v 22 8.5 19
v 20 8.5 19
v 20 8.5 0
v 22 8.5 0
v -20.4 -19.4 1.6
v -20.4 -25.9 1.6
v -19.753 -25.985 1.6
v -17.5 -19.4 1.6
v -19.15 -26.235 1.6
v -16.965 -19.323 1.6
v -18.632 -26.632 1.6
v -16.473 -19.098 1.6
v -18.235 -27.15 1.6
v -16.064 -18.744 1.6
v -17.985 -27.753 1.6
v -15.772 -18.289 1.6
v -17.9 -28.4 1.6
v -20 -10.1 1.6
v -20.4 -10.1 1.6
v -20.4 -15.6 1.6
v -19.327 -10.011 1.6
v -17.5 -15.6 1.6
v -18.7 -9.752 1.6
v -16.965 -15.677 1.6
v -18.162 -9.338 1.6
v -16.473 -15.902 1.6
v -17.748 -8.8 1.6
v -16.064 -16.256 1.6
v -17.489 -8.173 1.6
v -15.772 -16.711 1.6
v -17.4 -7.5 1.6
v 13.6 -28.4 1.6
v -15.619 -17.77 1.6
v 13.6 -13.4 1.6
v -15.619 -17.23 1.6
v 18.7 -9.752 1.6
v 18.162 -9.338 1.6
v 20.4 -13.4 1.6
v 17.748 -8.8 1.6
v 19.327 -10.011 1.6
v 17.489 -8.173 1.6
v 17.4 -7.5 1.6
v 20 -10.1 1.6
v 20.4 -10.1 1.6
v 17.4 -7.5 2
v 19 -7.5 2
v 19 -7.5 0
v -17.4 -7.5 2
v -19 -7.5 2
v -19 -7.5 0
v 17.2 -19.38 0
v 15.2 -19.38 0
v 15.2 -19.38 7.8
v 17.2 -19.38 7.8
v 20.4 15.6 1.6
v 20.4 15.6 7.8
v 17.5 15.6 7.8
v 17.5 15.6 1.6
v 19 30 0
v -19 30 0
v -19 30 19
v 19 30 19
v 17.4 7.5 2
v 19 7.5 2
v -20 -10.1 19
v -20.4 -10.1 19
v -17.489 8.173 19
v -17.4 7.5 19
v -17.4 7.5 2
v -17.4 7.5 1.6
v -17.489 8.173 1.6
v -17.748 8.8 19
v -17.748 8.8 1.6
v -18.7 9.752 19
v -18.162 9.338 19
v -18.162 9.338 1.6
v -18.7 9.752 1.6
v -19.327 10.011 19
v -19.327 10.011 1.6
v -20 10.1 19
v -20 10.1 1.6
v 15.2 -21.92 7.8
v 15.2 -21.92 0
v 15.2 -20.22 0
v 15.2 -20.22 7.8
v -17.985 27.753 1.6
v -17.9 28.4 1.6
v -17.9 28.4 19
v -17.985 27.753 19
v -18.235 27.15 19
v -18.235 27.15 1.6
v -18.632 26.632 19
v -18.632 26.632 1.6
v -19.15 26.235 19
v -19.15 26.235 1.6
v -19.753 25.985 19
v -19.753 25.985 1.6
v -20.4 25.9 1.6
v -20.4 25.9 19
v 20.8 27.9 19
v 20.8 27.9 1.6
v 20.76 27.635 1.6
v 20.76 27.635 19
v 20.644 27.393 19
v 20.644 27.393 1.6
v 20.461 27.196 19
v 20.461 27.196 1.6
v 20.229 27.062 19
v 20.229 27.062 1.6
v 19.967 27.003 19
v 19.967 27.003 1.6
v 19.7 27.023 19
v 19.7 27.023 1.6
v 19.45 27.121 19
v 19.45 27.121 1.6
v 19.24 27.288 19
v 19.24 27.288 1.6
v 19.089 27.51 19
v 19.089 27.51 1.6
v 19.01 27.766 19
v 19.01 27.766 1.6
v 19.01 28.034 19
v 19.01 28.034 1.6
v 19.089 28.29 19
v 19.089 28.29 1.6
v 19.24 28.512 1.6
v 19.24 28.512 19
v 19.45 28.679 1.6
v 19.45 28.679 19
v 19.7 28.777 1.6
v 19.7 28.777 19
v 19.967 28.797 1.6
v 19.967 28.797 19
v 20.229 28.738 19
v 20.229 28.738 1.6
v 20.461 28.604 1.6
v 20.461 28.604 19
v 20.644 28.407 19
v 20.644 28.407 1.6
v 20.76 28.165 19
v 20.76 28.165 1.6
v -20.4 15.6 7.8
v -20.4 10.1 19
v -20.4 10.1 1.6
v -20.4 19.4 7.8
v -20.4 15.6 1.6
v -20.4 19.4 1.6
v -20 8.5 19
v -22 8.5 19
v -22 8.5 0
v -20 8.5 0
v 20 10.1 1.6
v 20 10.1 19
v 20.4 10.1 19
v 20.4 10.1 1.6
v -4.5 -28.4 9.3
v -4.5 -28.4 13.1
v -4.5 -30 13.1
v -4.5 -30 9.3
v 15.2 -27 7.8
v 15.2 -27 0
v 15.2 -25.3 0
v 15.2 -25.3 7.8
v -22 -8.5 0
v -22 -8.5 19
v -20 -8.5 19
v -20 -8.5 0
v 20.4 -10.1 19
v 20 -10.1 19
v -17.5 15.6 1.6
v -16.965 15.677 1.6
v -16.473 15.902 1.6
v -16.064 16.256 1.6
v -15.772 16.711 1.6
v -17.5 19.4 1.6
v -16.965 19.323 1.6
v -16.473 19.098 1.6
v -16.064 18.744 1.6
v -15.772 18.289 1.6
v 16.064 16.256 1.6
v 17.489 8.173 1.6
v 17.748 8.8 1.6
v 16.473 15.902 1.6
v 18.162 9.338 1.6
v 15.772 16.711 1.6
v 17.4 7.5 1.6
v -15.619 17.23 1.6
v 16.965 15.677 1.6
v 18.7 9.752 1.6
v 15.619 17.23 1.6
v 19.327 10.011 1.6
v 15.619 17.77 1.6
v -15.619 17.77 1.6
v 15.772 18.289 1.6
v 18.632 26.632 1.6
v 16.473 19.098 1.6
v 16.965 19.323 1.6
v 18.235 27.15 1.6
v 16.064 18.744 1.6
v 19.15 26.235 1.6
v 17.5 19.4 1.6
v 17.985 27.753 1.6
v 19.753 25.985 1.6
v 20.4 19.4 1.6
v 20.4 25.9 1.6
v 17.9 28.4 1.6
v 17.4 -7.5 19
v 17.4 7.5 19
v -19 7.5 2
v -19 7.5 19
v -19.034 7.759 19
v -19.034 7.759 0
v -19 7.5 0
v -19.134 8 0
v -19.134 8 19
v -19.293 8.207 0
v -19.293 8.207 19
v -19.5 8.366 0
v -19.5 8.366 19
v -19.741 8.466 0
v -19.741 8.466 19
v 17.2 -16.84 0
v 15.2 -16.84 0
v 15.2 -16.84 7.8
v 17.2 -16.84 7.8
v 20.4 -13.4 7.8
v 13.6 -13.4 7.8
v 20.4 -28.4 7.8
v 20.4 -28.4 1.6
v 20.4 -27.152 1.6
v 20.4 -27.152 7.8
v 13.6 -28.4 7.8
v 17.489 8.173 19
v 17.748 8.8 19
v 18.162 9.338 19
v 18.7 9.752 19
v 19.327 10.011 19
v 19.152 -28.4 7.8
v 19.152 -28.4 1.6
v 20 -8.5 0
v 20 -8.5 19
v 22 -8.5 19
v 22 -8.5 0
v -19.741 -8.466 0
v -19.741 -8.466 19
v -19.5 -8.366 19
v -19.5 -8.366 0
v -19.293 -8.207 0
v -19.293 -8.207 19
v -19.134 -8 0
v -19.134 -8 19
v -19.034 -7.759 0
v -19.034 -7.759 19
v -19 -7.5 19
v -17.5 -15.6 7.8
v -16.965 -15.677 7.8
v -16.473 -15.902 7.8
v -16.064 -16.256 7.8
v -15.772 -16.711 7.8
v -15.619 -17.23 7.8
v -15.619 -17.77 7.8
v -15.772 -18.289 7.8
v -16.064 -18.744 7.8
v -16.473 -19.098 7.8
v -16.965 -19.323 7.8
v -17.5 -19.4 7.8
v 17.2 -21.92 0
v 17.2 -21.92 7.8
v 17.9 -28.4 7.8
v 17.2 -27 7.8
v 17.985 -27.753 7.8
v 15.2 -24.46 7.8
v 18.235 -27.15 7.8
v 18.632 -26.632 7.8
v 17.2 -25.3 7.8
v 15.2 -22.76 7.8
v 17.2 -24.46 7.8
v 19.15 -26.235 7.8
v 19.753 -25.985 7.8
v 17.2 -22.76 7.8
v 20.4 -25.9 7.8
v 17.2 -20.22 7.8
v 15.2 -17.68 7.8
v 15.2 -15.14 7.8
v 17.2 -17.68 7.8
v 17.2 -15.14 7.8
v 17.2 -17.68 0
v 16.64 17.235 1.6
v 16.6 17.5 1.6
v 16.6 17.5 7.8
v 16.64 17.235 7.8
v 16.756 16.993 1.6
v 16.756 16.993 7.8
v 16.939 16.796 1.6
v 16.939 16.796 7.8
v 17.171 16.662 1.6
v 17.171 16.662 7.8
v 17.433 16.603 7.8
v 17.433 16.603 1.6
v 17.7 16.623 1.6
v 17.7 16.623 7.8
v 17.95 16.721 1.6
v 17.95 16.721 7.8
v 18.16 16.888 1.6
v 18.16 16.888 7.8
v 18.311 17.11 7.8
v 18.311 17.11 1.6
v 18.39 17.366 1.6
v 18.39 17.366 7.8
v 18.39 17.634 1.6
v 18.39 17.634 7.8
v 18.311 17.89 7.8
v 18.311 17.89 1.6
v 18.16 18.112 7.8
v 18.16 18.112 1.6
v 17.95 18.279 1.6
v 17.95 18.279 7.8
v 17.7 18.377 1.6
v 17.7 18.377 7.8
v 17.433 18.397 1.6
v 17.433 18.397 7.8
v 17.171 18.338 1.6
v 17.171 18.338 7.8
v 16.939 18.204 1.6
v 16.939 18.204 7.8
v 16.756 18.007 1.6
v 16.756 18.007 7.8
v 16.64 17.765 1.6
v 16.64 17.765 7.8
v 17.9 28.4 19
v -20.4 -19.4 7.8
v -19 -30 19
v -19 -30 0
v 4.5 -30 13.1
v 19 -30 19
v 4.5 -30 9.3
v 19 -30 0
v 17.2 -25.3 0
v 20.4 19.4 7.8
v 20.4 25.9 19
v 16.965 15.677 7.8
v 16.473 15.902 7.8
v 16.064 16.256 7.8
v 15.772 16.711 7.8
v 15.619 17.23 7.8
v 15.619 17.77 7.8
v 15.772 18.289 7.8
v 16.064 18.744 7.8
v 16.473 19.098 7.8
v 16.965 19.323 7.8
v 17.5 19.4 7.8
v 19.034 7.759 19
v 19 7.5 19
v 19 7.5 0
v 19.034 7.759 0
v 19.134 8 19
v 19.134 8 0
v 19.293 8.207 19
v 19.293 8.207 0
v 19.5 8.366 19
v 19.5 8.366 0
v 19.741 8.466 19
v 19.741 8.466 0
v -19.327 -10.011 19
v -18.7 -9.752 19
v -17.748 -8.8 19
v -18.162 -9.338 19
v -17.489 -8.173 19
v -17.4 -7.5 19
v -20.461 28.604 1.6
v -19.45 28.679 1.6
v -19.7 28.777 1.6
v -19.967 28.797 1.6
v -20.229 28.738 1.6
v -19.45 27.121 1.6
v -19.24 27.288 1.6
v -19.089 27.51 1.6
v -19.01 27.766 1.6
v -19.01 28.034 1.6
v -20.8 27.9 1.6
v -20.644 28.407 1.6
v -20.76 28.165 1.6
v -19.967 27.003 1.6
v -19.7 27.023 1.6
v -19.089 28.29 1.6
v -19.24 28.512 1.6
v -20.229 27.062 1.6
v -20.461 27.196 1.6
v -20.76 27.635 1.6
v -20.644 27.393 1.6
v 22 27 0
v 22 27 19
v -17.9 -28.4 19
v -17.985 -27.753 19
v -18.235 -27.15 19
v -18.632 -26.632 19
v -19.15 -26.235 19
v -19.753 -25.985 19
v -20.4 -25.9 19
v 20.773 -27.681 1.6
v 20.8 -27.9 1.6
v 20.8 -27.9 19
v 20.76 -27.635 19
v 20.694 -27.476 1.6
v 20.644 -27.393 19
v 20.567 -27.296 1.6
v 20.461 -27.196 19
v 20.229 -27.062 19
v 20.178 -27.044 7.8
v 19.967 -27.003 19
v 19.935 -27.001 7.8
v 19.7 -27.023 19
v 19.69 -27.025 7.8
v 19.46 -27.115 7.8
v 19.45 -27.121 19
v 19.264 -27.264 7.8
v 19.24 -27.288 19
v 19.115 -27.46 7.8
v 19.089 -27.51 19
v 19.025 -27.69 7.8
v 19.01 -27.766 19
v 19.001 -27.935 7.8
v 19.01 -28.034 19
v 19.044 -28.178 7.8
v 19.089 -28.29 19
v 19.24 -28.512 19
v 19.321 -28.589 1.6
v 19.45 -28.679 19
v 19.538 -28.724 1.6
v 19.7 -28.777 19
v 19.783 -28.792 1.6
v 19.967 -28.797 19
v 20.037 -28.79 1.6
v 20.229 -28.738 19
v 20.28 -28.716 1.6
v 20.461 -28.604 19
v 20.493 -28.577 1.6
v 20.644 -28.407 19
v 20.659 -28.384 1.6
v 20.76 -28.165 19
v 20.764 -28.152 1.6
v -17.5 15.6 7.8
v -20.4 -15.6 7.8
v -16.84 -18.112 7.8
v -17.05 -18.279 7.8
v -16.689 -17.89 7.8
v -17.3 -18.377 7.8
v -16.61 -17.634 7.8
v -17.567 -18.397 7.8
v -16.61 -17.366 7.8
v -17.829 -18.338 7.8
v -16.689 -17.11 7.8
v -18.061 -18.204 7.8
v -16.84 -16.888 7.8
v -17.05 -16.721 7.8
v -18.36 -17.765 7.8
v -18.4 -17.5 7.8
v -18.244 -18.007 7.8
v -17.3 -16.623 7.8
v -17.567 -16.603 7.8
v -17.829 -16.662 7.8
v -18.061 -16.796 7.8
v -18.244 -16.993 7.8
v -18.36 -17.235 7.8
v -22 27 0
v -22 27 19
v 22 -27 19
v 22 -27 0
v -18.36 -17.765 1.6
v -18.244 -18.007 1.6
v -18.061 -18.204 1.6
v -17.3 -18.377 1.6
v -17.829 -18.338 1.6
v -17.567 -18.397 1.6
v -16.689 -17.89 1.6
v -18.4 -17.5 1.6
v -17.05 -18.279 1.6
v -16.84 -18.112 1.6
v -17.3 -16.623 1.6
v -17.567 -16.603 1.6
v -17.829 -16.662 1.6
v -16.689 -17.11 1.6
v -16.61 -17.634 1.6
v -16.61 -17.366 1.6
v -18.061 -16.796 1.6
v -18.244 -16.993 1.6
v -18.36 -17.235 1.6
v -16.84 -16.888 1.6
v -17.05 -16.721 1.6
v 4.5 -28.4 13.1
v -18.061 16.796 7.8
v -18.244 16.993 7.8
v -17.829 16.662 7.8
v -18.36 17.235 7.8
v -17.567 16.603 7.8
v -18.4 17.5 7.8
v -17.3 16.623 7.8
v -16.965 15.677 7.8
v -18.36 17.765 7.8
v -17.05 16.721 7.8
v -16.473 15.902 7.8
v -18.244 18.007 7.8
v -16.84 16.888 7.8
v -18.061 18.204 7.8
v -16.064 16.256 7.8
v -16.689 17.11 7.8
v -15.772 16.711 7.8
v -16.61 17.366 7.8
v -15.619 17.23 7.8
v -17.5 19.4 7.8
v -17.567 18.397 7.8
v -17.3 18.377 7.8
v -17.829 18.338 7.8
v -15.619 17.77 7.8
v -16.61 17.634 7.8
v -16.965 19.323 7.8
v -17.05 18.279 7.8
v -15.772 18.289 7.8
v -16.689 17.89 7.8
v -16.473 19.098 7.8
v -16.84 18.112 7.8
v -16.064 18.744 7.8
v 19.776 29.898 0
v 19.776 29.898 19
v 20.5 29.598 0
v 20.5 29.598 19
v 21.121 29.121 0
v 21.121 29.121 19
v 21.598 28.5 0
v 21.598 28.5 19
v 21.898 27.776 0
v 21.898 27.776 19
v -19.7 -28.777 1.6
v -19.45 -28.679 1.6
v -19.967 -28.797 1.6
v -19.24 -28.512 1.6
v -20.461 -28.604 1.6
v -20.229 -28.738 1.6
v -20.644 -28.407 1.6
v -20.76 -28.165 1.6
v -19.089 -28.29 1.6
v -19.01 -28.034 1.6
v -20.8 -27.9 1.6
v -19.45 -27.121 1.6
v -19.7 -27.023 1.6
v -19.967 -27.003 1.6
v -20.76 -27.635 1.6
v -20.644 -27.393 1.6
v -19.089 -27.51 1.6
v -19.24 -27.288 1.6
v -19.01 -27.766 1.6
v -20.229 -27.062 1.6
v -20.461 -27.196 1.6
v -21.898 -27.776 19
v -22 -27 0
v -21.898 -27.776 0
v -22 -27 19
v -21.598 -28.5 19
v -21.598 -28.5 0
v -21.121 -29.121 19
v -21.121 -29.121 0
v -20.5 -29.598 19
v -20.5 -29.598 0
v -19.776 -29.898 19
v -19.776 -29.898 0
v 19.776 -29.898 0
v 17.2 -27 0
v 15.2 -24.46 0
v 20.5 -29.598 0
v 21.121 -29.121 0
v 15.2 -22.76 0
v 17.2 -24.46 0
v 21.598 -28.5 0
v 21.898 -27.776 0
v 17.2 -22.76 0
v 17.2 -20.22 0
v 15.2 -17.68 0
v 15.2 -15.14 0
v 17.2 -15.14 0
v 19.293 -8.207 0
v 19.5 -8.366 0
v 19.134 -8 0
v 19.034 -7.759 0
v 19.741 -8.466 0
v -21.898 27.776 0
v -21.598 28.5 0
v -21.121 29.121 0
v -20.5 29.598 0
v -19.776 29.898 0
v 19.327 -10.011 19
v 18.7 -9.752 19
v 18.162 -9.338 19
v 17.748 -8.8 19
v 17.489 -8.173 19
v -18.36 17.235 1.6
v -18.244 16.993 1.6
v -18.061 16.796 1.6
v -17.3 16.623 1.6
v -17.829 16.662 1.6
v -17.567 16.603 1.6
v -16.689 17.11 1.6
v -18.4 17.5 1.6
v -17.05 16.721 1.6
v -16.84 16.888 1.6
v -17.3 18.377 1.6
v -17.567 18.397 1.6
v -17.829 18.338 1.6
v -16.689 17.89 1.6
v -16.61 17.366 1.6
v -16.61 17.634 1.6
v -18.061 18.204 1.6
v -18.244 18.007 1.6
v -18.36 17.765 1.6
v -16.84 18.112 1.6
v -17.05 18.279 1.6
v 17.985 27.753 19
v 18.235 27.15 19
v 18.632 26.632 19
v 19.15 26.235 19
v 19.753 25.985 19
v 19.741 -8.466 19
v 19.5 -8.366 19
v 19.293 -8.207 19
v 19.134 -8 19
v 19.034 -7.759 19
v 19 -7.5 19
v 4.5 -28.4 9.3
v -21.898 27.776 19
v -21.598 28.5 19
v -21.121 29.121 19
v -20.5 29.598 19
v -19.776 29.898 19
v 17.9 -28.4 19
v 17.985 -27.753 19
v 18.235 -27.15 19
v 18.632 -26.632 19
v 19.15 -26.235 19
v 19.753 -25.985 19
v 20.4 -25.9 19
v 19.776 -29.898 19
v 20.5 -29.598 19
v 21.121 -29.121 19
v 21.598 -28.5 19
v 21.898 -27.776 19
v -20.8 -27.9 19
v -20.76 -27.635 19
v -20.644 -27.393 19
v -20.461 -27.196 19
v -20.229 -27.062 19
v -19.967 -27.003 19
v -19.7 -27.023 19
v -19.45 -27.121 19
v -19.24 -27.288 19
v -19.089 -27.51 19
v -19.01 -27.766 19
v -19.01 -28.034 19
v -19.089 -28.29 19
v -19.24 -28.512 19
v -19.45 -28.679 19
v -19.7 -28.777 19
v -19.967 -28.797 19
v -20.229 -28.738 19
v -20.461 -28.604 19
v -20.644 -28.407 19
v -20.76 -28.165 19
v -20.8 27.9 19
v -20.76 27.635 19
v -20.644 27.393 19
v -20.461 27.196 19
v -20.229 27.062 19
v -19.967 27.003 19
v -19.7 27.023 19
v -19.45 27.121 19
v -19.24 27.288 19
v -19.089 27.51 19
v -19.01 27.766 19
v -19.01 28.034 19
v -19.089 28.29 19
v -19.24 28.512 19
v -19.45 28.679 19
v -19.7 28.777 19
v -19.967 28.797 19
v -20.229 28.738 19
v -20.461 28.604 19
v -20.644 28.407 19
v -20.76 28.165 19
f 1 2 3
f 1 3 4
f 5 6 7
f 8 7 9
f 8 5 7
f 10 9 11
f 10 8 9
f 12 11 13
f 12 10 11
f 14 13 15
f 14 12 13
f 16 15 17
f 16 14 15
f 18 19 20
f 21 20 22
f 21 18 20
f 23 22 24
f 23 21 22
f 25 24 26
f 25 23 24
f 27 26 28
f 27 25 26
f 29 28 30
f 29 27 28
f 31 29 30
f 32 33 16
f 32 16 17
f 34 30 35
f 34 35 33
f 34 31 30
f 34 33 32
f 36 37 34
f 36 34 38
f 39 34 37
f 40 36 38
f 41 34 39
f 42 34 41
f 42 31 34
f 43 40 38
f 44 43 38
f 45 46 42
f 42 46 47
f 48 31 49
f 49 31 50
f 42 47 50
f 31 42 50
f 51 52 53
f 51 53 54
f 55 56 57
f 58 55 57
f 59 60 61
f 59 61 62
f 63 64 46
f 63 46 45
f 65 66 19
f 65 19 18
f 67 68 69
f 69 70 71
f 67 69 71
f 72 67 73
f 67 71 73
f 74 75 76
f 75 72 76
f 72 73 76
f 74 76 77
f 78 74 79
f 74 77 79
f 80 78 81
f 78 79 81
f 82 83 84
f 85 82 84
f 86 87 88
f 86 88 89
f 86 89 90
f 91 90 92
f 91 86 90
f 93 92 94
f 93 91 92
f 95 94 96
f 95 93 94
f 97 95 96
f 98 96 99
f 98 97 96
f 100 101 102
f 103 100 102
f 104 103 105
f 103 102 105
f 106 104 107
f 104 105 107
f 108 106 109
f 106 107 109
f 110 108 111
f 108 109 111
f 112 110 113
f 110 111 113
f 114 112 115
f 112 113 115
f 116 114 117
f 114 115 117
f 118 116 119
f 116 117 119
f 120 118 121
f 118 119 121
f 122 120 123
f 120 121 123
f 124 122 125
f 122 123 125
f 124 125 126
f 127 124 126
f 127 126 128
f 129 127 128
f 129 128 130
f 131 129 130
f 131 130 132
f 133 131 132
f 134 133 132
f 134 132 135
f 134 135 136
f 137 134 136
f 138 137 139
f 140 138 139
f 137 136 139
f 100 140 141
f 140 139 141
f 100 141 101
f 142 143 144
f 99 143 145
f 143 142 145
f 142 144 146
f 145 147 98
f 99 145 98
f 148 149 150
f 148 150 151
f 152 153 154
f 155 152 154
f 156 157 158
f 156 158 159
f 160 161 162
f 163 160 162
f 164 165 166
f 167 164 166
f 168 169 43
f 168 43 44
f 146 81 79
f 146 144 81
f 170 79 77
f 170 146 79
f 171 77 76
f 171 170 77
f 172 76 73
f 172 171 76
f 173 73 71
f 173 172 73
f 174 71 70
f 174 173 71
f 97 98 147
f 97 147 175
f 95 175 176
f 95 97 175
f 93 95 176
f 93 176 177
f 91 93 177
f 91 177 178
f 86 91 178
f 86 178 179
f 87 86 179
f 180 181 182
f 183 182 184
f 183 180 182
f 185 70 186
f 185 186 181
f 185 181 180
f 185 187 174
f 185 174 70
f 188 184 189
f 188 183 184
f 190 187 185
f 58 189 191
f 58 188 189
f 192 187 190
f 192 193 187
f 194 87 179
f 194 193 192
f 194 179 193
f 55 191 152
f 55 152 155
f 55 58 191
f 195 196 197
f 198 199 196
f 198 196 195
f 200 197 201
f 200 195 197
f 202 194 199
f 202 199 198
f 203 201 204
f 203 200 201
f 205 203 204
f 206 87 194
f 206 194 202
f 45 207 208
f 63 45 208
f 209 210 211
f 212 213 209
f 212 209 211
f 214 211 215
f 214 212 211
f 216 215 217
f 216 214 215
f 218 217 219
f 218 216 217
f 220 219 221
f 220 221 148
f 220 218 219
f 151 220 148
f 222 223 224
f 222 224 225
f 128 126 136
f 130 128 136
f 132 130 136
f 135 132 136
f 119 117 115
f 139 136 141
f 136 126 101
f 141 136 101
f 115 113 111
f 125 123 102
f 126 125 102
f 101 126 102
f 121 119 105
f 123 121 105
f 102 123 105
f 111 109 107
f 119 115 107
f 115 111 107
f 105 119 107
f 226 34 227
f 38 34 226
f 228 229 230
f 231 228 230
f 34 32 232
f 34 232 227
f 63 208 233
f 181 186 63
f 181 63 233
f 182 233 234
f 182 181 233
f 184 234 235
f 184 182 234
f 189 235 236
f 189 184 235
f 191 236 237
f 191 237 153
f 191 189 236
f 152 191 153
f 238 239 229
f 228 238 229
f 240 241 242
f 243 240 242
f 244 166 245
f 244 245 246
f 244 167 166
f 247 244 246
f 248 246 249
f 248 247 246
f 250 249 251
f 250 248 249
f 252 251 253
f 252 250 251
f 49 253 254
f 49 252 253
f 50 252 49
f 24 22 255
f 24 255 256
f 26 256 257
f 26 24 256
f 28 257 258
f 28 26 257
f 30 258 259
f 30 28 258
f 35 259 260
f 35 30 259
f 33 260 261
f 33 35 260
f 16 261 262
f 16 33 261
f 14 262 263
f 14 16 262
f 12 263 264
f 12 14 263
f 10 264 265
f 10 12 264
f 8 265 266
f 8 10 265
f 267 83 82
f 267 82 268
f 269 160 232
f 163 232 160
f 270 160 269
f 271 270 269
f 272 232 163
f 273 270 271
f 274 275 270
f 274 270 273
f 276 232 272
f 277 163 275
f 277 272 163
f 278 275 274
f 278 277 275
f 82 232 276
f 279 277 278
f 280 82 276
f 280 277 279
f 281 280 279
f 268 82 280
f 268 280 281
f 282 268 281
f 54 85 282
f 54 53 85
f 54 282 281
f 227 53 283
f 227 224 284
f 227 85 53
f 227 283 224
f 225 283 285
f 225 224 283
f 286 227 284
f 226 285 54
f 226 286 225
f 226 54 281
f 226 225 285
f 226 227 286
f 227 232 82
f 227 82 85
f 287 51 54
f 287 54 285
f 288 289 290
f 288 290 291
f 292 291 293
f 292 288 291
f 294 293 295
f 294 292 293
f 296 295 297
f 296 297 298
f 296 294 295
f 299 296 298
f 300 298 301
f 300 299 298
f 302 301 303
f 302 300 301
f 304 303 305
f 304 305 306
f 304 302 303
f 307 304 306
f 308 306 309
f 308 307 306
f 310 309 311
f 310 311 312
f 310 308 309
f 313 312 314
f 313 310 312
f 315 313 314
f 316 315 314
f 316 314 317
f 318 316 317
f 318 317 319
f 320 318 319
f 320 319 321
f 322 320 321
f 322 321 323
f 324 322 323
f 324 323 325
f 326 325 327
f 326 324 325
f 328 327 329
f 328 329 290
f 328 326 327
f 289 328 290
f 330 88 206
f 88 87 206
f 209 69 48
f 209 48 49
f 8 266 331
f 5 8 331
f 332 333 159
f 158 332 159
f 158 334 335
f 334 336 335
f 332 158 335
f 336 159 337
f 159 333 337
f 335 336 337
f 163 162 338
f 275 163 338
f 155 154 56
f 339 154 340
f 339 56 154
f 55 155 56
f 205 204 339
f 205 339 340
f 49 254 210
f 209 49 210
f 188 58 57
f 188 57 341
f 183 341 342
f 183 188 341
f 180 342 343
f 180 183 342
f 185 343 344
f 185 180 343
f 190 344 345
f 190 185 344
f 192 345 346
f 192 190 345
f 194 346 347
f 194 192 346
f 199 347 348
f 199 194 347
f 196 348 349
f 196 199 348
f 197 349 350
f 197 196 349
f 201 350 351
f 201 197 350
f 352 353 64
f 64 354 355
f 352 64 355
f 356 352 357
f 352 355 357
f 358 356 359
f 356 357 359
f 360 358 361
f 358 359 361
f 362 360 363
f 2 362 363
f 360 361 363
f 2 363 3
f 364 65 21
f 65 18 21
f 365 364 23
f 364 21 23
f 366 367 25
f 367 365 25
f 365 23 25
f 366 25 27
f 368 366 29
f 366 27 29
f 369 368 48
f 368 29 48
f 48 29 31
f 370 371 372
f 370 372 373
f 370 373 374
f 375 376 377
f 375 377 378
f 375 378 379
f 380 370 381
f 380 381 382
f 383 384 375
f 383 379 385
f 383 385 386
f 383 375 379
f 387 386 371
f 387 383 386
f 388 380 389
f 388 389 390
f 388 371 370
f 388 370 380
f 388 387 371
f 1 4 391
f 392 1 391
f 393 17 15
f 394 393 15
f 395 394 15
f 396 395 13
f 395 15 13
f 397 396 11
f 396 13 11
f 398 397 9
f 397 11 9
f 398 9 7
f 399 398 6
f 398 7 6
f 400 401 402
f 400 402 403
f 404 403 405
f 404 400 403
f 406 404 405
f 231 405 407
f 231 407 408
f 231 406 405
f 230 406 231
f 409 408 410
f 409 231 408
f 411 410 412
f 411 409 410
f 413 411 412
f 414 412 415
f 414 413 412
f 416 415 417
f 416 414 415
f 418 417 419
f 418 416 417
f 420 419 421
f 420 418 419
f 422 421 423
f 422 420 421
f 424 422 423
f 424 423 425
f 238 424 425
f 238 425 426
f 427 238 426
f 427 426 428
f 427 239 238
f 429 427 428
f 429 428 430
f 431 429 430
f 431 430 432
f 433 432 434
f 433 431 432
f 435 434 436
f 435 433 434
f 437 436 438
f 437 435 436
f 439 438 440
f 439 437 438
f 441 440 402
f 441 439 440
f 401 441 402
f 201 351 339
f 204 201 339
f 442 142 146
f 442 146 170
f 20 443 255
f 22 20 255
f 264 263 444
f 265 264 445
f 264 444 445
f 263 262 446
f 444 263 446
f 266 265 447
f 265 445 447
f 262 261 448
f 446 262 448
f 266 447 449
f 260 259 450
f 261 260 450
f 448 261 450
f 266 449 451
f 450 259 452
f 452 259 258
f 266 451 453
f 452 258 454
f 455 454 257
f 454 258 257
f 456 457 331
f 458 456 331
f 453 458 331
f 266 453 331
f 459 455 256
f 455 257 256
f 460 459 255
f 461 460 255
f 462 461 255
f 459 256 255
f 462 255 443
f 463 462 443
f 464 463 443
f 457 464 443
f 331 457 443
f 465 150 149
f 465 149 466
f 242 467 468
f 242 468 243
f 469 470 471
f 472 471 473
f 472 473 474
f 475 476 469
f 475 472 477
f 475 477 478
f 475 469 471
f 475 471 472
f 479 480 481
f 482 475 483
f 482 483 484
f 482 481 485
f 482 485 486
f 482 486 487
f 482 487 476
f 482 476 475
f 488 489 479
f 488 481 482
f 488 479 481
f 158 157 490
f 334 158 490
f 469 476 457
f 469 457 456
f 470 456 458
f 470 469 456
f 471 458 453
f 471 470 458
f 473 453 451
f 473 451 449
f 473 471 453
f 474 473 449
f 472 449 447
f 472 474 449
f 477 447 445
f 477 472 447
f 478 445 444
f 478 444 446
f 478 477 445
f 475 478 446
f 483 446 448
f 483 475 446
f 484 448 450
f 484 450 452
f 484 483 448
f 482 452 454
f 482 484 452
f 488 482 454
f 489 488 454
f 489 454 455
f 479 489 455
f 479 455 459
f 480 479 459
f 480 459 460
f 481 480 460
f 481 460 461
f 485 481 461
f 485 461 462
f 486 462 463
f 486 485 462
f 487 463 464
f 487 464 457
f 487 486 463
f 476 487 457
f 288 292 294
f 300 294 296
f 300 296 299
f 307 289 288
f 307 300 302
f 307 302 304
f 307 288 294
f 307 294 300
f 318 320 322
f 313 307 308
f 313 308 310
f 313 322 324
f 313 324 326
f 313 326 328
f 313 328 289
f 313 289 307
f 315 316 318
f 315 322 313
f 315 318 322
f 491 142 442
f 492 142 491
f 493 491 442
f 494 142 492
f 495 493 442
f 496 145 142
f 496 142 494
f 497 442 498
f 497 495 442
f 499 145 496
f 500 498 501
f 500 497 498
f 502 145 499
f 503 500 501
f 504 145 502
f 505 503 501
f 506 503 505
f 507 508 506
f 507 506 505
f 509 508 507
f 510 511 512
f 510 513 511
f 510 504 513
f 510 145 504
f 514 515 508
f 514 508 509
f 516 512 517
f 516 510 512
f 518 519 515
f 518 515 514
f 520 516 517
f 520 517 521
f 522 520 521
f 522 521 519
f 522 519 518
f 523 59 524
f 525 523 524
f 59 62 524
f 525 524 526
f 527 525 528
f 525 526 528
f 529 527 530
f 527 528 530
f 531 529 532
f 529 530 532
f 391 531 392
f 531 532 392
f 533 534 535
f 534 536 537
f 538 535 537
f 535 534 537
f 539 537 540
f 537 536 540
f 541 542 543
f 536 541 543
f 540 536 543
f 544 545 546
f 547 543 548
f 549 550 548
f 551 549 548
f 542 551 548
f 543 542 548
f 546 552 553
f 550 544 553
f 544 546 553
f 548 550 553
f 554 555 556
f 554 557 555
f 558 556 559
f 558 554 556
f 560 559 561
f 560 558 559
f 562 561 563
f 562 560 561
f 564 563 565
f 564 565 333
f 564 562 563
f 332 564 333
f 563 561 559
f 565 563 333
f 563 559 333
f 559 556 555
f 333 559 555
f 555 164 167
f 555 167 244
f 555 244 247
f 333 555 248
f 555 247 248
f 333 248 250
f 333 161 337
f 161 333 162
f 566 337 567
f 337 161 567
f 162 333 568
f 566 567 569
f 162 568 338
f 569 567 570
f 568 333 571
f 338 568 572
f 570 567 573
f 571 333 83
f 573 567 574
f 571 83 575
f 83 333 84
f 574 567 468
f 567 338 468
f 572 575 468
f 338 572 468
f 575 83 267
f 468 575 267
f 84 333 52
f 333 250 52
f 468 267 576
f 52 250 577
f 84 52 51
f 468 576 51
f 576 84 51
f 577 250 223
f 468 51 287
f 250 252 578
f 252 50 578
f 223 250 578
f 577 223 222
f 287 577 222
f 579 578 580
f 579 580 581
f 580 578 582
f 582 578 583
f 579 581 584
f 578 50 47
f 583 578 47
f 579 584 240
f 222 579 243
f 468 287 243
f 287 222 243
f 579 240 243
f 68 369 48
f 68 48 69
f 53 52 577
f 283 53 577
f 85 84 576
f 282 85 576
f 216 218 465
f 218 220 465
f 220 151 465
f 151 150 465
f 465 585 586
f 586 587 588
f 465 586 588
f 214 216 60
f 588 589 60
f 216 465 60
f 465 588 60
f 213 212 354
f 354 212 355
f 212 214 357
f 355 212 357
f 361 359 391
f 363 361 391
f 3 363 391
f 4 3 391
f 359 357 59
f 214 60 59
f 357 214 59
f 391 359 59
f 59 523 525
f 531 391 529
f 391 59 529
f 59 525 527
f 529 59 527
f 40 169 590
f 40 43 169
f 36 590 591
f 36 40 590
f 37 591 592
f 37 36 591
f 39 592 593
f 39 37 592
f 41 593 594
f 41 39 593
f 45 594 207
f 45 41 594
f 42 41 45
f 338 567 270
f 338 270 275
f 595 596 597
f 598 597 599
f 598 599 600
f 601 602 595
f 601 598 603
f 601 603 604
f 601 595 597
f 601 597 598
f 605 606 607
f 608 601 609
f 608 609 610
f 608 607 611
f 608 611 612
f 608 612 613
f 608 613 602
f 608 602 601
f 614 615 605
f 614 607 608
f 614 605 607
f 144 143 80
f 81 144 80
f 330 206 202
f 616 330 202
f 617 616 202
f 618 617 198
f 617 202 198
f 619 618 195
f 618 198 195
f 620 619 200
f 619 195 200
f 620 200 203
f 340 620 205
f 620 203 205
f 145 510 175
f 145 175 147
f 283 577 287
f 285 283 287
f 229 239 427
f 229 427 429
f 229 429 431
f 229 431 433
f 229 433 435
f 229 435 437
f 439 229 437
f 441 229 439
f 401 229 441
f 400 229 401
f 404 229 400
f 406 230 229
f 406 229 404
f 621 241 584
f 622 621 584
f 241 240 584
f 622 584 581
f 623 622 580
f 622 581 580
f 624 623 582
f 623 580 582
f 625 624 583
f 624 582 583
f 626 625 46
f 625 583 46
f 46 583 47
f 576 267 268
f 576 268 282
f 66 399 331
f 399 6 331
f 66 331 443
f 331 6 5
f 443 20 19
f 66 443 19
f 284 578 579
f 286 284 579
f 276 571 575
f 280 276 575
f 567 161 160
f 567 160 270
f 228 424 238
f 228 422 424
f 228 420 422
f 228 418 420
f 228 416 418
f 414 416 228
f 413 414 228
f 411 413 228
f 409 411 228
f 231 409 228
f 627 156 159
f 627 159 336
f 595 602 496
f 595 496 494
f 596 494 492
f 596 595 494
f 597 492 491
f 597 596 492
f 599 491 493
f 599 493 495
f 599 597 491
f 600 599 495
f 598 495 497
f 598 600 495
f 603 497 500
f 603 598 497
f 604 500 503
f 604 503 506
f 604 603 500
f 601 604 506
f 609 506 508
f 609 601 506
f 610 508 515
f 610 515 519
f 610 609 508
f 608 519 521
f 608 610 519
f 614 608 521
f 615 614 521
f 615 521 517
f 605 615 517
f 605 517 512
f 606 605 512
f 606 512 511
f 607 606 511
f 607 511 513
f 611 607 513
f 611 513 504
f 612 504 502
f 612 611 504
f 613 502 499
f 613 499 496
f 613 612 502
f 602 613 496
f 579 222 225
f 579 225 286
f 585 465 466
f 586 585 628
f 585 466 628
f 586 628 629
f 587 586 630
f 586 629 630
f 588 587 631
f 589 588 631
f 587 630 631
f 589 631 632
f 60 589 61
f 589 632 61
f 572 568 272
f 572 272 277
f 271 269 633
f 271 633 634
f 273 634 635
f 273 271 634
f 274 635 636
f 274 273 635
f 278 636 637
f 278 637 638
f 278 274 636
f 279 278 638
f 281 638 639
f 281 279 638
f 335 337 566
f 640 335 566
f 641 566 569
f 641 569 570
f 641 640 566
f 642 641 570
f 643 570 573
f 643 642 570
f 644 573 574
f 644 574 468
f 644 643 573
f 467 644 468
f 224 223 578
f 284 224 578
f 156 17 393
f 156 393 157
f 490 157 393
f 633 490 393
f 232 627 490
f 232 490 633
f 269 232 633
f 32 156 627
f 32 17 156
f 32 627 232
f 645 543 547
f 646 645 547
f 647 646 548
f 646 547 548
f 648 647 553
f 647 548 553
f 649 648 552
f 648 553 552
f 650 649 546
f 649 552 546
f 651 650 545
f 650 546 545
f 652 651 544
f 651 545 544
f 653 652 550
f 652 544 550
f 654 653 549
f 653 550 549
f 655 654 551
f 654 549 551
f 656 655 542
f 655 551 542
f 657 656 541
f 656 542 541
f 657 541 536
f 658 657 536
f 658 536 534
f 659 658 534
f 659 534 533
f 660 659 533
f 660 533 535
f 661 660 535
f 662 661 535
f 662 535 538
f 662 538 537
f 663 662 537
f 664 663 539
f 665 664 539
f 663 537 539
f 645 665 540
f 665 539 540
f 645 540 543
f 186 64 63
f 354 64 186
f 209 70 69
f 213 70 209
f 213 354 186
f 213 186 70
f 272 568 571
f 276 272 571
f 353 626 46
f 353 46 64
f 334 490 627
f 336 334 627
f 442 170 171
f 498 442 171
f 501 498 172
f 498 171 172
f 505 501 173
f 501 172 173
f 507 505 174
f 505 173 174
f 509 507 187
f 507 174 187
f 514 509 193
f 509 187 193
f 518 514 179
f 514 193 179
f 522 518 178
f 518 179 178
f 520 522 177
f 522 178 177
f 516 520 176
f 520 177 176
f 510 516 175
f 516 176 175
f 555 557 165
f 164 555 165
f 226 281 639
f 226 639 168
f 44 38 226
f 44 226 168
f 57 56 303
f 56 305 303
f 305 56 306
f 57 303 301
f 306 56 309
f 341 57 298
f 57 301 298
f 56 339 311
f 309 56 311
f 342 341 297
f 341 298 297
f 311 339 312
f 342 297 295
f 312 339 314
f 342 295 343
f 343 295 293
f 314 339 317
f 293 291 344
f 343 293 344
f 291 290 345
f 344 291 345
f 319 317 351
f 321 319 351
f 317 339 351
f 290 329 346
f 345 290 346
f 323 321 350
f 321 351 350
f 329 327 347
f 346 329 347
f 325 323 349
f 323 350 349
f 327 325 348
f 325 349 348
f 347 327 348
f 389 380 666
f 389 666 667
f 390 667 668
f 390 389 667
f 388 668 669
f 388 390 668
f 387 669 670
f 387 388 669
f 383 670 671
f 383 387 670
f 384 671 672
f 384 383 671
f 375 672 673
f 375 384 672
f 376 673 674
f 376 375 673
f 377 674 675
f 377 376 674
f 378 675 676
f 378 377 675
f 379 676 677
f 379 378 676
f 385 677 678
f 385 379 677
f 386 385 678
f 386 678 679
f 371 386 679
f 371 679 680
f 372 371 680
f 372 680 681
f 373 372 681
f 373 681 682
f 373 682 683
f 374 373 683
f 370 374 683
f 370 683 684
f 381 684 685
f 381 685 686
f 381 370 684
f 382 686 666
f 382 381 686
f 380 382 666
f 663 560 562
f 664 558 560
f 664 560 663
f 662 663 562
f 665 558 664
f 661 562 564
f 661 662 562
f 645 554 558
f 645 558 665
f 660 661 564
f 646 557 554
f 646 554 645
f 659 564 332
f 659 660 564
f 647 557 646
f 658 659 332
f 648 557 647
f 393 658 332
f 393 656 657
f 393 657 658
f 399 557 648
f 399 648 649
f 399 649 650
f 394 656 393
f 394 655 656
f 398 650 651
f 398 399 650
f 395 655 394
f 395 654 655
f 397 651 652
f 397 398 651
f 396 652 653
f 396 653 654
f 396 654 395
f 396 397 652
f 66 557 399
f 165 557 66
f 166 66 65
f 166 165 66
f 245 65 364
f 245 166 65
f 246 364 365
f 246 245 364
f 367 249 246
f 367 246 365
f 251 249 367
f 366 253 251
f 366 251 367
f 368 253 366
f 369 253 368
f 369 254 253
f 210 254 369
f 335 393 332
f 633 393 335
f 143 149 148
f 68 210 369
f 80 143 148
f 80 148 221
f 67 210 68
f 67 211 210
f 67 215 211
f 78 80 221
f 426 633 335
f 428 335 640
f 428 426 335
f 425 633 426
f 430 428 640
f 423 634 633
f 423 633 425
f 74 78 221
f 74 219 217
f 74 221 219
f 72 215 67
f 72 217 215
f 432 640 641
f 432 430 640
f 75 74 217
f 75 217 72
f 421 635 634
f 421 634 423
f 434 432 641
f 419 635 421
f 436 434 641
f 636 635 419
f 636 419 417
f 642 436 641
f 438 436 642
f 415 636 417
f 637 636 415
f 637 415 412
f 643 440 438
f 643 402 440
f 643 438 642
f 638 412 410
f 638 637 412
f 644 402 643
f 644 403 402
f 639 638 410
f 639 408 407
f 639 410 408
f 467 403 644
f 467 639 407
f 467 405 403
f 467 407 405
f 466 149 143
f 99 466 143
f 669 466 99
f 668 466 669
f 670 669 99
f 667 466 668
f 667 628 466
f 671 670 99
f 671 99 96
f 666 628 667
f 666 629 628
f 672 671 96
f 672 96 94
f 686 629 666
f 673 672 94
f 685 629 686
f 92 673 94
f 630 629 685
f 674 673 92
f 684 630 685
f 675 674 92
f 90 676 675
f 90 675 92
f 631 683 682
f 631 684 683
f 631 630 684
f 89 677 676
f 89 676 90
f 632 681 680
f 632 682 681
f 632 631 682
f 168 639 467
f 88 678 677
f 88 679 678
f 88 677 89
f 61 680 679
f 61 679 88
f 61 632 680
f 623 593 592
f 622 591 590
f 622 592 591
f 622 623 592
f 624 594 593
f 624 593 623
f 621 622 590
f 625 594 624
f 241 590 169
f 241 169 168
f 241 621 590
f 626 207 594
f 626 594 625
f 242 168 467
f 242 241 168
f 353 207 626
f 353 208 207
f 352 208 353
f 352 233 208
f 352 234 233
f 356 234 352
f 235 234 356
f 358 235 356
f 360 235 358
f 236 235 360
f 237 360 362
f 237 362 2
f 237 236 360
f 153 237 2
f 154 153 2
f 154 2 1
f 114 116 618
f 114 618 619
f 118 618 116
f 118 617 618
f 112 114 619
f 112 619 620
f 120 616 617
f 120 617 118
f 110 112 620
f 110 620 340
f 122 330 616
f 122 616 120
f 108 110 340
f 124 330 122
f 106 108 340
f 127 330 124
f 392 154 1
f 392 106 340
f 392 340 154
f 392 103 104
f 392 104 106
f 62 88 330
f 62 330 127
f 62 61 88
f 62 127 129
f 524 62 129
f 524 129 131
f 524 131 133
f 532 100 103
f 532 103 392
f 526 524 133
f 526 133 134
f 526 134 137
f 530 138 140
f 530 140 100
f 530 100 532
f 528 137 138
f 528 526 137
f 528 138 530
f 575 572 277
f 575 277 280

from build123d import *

# Parameters (mm, degrees)
SKETCH_1_W               = 44
SKETCH_1_H               = 60
EXTRUDE_1_DEPTH          = 19
SKETCH_2_W               = 3
SKETCH_2_H               = 17
CUT_EXTRUDE_1_DEPTH      = 42.773197148
FILLET_1_R               = 3
FILLET_2_R               = 1
SHELL_1_T                = -1.6
EXTRUDE_2_DEPTH          = 17.4
SKETCH_3_3_R             = 0.9
CUT_EXTRUDE_2_DEPTH      = 17.4
MIRROR_2_COPY_1_DEPTH    = 17.4
MIRROR_2_COPY_2_SKETCH_R = 0.9
MIRROR_2_COPY_2_DEPTH    = 17.4
SKETCH_4_W               = 6.8
SKETCH_4_H               = 15
EXTRUDE_3_DEPTH          = 6.2
CUT_EXTRUDE_3_DEPTH      = 42.070183832
CUT_EXTRUDE_3_DEPTH_BACK = 42.070183832
SKETCH_4_4_W             = 2
SKETCH_4_4_H             = 1.7
SKETCH_5_R               = 0.9
EXTRUDE_4_DEPTH          = 6.2
SKETCH_6_W               = 9
SKETCH_6_H               = 3.8
CUT_EXTRUDE_4_DEPTH      = 66.234653368
SKETCH_7_W               = 38
SKETCH_7_H               = 15
CUT_EXTRUDE_5_DEPTH      = 2


with BuildPart() as part:
    # 草图1 → 凸台-拉伸1 (new body)
    with BuildSketch(Plane.XY):
        Rectangle(SKETCH_1_W, SKETCH_1_H)
    extrude(amount=EXTRUDE_1_DEPTH)

    # 草图2 → 切除-拉伸1 (cut, through all)
    with BuildSketch(Plane.XY.offset(19)):
        with Locations((-20.5, 0)):
            Rectangle(SKETCH_2_W, SKETCH_2_H)
        with Locations((20.5, 0)):
            Rectangle(SKETCH_2_W, SKETCH_2_H)
    extrude(amount=-CUT_EXTRUDE_1_DEPTH, mode=Mode.SUBTRACT)

    # 圆角1
    fillet_1_edges = [part.edges().sort_by_distance(p)[0] for p in [
        (22, -30, 9.5),
        (-22, -30, 9.5),
        (-22, 30, 9.5),
        (22, 30, 9.5),
    ]]
    fillet(fillet_1_edges, radius=FILLET_1_R)

    # 圆角2
    fillet_2_edges = [part.edges().sort_by_distance(p)[0] for p in [
        (-19, 8.5, 9.5),
        (-19, -8.5, 9.5),
        (19, -8.5, 9.5),
        (19, 8.5, 9.5),
    ]]
    fillet(fillet_2_edges, radius=FILLET_2_R)

    # 抽壳1
    shell_1_openings = [part.faces().sort_by_distance(p)[0] for p in [
        (0, 0, 19),
    ]]
    offset(amount=SHELL_1_T, openings=shell_1_openings, kind=Kind.INTERSECTION)

    # 草图3 → 凸台-拉伸2 (add)
    with BuildSketch(Plane.XY.offset(1.6)):
        with BuildLine():
            Line((-20.4, 28.4), (-17.9, 28.4))
            ThreePointArc((-17.9, 28.4), (-18.632233047, 26.632233047), (-20.4, 25.9))
            Line((-20.4, 25.9), (-20.4, 28.4))
        make_face()
    extrude_2 = extrude(amount=EXTRUDE_2_DEPTH)

    # 草图3<3> → 切除-拉伸2 (cut)
    with BuildSketch(Plane.XY.offset(1.6)):
        with Locations(Location((-19.9, 27.9, 0), (0, 0, 180))):
            Circle(SKETCH_3_3_R)
    cut_extrude_2 = extrude(amount=CUT_EXTRUDE_2_DEPTH, mode=Mode.SUBTRACT)

    # 镜向1: 凸台-拉伸2, 切除-拉伸2 across plane
    add(extrude_2.mirror(Plane(origin=(0, 0, 0), x_dir=(0, 0, 1), z_dir=(1, 0, 0))))
    add(cut_extrude_2.mirror(Plane(origin=(0, 0, 0), x_dir=(0, 0, 1), z_dir=(1, 0, 0))), mode=Mode.SUBTRACT)

    # 镜向2: 凸台-拉伸2, 切除-拉伸2 across plane
    add(extrude_2.mirror(Plane.ZX))
    add(cut_extrude_2.mirror(Plane.ZX), mode=Mode.SUBTRACT)

    # 镜向2 copy 1 sketch → 镜向2 copy 1 (add)
    with BuildSketch(Plane(origin=(0, 0, 1.6), x_dir=(-1, 0, 0), z_dir=(0, 0, 1))):
        with BuildLine():
            Line((-20.4, 28.4), (-17.9, 28.4))
            ThreePointArc((-17.9, 28.4), (-18.632233047, 26.632233047), (-20.4, 25.9))
            Line((-20.4, 25.9), (-20.4, 28.4))
        make_face()
    extrude(amount=MIRROR_2_COPY_1_DEPTH)

    # 镜向2 copy 2 sketch → 镜向2 copy 2 (cut)
    with BuildSketch(Plane(origin=(0, 0, 1.6), x_dir=(-1, 0, 0), z_dir=(0, 0, 1))):
        with Locations(Location((-19.9, 27.9, 0), (0, 0, 180))):
            Circle(MIRROR_2_COPY_2_SKETCH_R)
    extrude(amount=MIRROR_2_COPY_2_DEPTH, mode=Mode.SUBTRACT)

    # 草图4 → 凸台-拉伸3 (add)
    with BuildSketch(Plane.XY.offset(1.6)):
        with Locations((17, -20.9)):
            Rectangle(SKETCH_4_W, SKETCH_4_H)
    extrude(amount=EXTRUDE_3_DEPTH)

    # 草图4<4> → 切除-拉伸3 (cut, two sides: drawn at the far end of the back side and taken through both)
    with BuildSketch(Plane.XY.offset(1.6).offset(-CUT_EXTRUDE_3_DEPTH_BACK)):
        with Locations((16.2, -26.15)):
            Rectangle(SKETCH_4_4_W, SKETCH_4_4_H)
        with Locations((16.2, -23.61)):
            Rectangle(SKETCH_4_4_W, SKETCH_4_4_H)
        with Locations((16.2, -21.07)):
            Rectangle(SKETCH_4_4_W, SKETCH_4_4_H)
        with Locations((16.2, -18.53)):
            Rectangle(SKETCH_4_4_W, SKETCH_4_4_H)
        with Locations((16.2, -15.99)):
            Rectangle(SKETCH_4_4_W, SKETCH_4_4_H)
    extrude(amount=CUT_EXTRUDE_3_DEPTH + CUT_EXTRUDE_3_DEPTH_BACK, mode=Mode.SUBTRACT)

    # 草图5 → 凸台-拉伸4 (add)
    # profile 1 of 3: a face of its own
    with BuildSketch(Plane.XY.offset(1.6)):
        with BuildLine():
            Line((-17.5, 19.4), (-20.4, 19.4))
            Line((-20.4, 19.4), (-20.4, 15.6))
            Line((-20.4, 15.6), (-17.5, 15.6))
            ThreePointArc((-17.5, 15.6), (-15.6, 17.5), (-17.5, 19.4))
        make_face()
        with Locations(Location((-17.5, 17.5, 0), (0, 0, 180))):
            Circle(SKETCH_5_R, mode=Mode.SUBTRACT)
    # profile 2 of 3: a face of its own
    with BuildSketch(Plane.XY.offset(1.6)):
        with BuildLine():
            Line((20.4, 15.6), (17.5, 15.6))
            ThreePointArc((17.5, 15.6), (15.6, 17.5), (17.5, 19.4))
            Line((17.5, 19.4), (20.4, 19.4))
            Line((20.4, 19.4), (20.4, 15.6))
        make_face()
        with Locations(Location((17.5, 17.5, 0), (0, 0, 180))):
            Circle(SKETCH_5_R, mode=Mode.SUBTRACT)
    # profile 3 of 3: a face of its own
    with BuildSketch(Plane.XY.offset(1.6)):
        with BuildLine():
            Line((-20.4, -15.6), (-17.5, -15.6))
            ThreePointArc((-17.5, -15.6), (-15.6, -17.5), (-17.5, -19.4))
            Line((-17.5, -19.4), (-20.4, -19.4))
            Line((-20.4, -19.4), (-20.4, -15.6))
        make_face()
        with Locations(Location((-17.5, -17.5, 0), (0, 0, 180))):
            Circle(SKETCH_5_R, mode=Mode.SUBTRACT)
    extrude(amount=EXTRUDE_4_DEPTH)

    # 草图6 → 切除-拉伸4 (cut, through all)
    with BuildSketch(Plane(origin=(0, -28.4, 0), x_dir=(1, 0, 0), z_dir=(0, 1, 0))):
        with Locations((0, -11.2)):
            Rectangle(SKETCH_6_W, SKETCH_6_H)
    extrude(amount=-CUT_EXTRUDE_4_DEPTH, mode=Mode.SUBTRACT)

    # 草图7 → 切除-拉伸5 (cut)
    with BuildSketch(Plane(origin=(0, 0, 0), x_dir=(-1, 0, 0), z_dir=(0, 0, -1))):
        Rectangle(SKETCH_7_W, SKETCH_7_H)
    extrude(amount=-CUT_EXTRUDE_5_DEPTH, mode=Mode.SUBTRACT)


solid = part.part
